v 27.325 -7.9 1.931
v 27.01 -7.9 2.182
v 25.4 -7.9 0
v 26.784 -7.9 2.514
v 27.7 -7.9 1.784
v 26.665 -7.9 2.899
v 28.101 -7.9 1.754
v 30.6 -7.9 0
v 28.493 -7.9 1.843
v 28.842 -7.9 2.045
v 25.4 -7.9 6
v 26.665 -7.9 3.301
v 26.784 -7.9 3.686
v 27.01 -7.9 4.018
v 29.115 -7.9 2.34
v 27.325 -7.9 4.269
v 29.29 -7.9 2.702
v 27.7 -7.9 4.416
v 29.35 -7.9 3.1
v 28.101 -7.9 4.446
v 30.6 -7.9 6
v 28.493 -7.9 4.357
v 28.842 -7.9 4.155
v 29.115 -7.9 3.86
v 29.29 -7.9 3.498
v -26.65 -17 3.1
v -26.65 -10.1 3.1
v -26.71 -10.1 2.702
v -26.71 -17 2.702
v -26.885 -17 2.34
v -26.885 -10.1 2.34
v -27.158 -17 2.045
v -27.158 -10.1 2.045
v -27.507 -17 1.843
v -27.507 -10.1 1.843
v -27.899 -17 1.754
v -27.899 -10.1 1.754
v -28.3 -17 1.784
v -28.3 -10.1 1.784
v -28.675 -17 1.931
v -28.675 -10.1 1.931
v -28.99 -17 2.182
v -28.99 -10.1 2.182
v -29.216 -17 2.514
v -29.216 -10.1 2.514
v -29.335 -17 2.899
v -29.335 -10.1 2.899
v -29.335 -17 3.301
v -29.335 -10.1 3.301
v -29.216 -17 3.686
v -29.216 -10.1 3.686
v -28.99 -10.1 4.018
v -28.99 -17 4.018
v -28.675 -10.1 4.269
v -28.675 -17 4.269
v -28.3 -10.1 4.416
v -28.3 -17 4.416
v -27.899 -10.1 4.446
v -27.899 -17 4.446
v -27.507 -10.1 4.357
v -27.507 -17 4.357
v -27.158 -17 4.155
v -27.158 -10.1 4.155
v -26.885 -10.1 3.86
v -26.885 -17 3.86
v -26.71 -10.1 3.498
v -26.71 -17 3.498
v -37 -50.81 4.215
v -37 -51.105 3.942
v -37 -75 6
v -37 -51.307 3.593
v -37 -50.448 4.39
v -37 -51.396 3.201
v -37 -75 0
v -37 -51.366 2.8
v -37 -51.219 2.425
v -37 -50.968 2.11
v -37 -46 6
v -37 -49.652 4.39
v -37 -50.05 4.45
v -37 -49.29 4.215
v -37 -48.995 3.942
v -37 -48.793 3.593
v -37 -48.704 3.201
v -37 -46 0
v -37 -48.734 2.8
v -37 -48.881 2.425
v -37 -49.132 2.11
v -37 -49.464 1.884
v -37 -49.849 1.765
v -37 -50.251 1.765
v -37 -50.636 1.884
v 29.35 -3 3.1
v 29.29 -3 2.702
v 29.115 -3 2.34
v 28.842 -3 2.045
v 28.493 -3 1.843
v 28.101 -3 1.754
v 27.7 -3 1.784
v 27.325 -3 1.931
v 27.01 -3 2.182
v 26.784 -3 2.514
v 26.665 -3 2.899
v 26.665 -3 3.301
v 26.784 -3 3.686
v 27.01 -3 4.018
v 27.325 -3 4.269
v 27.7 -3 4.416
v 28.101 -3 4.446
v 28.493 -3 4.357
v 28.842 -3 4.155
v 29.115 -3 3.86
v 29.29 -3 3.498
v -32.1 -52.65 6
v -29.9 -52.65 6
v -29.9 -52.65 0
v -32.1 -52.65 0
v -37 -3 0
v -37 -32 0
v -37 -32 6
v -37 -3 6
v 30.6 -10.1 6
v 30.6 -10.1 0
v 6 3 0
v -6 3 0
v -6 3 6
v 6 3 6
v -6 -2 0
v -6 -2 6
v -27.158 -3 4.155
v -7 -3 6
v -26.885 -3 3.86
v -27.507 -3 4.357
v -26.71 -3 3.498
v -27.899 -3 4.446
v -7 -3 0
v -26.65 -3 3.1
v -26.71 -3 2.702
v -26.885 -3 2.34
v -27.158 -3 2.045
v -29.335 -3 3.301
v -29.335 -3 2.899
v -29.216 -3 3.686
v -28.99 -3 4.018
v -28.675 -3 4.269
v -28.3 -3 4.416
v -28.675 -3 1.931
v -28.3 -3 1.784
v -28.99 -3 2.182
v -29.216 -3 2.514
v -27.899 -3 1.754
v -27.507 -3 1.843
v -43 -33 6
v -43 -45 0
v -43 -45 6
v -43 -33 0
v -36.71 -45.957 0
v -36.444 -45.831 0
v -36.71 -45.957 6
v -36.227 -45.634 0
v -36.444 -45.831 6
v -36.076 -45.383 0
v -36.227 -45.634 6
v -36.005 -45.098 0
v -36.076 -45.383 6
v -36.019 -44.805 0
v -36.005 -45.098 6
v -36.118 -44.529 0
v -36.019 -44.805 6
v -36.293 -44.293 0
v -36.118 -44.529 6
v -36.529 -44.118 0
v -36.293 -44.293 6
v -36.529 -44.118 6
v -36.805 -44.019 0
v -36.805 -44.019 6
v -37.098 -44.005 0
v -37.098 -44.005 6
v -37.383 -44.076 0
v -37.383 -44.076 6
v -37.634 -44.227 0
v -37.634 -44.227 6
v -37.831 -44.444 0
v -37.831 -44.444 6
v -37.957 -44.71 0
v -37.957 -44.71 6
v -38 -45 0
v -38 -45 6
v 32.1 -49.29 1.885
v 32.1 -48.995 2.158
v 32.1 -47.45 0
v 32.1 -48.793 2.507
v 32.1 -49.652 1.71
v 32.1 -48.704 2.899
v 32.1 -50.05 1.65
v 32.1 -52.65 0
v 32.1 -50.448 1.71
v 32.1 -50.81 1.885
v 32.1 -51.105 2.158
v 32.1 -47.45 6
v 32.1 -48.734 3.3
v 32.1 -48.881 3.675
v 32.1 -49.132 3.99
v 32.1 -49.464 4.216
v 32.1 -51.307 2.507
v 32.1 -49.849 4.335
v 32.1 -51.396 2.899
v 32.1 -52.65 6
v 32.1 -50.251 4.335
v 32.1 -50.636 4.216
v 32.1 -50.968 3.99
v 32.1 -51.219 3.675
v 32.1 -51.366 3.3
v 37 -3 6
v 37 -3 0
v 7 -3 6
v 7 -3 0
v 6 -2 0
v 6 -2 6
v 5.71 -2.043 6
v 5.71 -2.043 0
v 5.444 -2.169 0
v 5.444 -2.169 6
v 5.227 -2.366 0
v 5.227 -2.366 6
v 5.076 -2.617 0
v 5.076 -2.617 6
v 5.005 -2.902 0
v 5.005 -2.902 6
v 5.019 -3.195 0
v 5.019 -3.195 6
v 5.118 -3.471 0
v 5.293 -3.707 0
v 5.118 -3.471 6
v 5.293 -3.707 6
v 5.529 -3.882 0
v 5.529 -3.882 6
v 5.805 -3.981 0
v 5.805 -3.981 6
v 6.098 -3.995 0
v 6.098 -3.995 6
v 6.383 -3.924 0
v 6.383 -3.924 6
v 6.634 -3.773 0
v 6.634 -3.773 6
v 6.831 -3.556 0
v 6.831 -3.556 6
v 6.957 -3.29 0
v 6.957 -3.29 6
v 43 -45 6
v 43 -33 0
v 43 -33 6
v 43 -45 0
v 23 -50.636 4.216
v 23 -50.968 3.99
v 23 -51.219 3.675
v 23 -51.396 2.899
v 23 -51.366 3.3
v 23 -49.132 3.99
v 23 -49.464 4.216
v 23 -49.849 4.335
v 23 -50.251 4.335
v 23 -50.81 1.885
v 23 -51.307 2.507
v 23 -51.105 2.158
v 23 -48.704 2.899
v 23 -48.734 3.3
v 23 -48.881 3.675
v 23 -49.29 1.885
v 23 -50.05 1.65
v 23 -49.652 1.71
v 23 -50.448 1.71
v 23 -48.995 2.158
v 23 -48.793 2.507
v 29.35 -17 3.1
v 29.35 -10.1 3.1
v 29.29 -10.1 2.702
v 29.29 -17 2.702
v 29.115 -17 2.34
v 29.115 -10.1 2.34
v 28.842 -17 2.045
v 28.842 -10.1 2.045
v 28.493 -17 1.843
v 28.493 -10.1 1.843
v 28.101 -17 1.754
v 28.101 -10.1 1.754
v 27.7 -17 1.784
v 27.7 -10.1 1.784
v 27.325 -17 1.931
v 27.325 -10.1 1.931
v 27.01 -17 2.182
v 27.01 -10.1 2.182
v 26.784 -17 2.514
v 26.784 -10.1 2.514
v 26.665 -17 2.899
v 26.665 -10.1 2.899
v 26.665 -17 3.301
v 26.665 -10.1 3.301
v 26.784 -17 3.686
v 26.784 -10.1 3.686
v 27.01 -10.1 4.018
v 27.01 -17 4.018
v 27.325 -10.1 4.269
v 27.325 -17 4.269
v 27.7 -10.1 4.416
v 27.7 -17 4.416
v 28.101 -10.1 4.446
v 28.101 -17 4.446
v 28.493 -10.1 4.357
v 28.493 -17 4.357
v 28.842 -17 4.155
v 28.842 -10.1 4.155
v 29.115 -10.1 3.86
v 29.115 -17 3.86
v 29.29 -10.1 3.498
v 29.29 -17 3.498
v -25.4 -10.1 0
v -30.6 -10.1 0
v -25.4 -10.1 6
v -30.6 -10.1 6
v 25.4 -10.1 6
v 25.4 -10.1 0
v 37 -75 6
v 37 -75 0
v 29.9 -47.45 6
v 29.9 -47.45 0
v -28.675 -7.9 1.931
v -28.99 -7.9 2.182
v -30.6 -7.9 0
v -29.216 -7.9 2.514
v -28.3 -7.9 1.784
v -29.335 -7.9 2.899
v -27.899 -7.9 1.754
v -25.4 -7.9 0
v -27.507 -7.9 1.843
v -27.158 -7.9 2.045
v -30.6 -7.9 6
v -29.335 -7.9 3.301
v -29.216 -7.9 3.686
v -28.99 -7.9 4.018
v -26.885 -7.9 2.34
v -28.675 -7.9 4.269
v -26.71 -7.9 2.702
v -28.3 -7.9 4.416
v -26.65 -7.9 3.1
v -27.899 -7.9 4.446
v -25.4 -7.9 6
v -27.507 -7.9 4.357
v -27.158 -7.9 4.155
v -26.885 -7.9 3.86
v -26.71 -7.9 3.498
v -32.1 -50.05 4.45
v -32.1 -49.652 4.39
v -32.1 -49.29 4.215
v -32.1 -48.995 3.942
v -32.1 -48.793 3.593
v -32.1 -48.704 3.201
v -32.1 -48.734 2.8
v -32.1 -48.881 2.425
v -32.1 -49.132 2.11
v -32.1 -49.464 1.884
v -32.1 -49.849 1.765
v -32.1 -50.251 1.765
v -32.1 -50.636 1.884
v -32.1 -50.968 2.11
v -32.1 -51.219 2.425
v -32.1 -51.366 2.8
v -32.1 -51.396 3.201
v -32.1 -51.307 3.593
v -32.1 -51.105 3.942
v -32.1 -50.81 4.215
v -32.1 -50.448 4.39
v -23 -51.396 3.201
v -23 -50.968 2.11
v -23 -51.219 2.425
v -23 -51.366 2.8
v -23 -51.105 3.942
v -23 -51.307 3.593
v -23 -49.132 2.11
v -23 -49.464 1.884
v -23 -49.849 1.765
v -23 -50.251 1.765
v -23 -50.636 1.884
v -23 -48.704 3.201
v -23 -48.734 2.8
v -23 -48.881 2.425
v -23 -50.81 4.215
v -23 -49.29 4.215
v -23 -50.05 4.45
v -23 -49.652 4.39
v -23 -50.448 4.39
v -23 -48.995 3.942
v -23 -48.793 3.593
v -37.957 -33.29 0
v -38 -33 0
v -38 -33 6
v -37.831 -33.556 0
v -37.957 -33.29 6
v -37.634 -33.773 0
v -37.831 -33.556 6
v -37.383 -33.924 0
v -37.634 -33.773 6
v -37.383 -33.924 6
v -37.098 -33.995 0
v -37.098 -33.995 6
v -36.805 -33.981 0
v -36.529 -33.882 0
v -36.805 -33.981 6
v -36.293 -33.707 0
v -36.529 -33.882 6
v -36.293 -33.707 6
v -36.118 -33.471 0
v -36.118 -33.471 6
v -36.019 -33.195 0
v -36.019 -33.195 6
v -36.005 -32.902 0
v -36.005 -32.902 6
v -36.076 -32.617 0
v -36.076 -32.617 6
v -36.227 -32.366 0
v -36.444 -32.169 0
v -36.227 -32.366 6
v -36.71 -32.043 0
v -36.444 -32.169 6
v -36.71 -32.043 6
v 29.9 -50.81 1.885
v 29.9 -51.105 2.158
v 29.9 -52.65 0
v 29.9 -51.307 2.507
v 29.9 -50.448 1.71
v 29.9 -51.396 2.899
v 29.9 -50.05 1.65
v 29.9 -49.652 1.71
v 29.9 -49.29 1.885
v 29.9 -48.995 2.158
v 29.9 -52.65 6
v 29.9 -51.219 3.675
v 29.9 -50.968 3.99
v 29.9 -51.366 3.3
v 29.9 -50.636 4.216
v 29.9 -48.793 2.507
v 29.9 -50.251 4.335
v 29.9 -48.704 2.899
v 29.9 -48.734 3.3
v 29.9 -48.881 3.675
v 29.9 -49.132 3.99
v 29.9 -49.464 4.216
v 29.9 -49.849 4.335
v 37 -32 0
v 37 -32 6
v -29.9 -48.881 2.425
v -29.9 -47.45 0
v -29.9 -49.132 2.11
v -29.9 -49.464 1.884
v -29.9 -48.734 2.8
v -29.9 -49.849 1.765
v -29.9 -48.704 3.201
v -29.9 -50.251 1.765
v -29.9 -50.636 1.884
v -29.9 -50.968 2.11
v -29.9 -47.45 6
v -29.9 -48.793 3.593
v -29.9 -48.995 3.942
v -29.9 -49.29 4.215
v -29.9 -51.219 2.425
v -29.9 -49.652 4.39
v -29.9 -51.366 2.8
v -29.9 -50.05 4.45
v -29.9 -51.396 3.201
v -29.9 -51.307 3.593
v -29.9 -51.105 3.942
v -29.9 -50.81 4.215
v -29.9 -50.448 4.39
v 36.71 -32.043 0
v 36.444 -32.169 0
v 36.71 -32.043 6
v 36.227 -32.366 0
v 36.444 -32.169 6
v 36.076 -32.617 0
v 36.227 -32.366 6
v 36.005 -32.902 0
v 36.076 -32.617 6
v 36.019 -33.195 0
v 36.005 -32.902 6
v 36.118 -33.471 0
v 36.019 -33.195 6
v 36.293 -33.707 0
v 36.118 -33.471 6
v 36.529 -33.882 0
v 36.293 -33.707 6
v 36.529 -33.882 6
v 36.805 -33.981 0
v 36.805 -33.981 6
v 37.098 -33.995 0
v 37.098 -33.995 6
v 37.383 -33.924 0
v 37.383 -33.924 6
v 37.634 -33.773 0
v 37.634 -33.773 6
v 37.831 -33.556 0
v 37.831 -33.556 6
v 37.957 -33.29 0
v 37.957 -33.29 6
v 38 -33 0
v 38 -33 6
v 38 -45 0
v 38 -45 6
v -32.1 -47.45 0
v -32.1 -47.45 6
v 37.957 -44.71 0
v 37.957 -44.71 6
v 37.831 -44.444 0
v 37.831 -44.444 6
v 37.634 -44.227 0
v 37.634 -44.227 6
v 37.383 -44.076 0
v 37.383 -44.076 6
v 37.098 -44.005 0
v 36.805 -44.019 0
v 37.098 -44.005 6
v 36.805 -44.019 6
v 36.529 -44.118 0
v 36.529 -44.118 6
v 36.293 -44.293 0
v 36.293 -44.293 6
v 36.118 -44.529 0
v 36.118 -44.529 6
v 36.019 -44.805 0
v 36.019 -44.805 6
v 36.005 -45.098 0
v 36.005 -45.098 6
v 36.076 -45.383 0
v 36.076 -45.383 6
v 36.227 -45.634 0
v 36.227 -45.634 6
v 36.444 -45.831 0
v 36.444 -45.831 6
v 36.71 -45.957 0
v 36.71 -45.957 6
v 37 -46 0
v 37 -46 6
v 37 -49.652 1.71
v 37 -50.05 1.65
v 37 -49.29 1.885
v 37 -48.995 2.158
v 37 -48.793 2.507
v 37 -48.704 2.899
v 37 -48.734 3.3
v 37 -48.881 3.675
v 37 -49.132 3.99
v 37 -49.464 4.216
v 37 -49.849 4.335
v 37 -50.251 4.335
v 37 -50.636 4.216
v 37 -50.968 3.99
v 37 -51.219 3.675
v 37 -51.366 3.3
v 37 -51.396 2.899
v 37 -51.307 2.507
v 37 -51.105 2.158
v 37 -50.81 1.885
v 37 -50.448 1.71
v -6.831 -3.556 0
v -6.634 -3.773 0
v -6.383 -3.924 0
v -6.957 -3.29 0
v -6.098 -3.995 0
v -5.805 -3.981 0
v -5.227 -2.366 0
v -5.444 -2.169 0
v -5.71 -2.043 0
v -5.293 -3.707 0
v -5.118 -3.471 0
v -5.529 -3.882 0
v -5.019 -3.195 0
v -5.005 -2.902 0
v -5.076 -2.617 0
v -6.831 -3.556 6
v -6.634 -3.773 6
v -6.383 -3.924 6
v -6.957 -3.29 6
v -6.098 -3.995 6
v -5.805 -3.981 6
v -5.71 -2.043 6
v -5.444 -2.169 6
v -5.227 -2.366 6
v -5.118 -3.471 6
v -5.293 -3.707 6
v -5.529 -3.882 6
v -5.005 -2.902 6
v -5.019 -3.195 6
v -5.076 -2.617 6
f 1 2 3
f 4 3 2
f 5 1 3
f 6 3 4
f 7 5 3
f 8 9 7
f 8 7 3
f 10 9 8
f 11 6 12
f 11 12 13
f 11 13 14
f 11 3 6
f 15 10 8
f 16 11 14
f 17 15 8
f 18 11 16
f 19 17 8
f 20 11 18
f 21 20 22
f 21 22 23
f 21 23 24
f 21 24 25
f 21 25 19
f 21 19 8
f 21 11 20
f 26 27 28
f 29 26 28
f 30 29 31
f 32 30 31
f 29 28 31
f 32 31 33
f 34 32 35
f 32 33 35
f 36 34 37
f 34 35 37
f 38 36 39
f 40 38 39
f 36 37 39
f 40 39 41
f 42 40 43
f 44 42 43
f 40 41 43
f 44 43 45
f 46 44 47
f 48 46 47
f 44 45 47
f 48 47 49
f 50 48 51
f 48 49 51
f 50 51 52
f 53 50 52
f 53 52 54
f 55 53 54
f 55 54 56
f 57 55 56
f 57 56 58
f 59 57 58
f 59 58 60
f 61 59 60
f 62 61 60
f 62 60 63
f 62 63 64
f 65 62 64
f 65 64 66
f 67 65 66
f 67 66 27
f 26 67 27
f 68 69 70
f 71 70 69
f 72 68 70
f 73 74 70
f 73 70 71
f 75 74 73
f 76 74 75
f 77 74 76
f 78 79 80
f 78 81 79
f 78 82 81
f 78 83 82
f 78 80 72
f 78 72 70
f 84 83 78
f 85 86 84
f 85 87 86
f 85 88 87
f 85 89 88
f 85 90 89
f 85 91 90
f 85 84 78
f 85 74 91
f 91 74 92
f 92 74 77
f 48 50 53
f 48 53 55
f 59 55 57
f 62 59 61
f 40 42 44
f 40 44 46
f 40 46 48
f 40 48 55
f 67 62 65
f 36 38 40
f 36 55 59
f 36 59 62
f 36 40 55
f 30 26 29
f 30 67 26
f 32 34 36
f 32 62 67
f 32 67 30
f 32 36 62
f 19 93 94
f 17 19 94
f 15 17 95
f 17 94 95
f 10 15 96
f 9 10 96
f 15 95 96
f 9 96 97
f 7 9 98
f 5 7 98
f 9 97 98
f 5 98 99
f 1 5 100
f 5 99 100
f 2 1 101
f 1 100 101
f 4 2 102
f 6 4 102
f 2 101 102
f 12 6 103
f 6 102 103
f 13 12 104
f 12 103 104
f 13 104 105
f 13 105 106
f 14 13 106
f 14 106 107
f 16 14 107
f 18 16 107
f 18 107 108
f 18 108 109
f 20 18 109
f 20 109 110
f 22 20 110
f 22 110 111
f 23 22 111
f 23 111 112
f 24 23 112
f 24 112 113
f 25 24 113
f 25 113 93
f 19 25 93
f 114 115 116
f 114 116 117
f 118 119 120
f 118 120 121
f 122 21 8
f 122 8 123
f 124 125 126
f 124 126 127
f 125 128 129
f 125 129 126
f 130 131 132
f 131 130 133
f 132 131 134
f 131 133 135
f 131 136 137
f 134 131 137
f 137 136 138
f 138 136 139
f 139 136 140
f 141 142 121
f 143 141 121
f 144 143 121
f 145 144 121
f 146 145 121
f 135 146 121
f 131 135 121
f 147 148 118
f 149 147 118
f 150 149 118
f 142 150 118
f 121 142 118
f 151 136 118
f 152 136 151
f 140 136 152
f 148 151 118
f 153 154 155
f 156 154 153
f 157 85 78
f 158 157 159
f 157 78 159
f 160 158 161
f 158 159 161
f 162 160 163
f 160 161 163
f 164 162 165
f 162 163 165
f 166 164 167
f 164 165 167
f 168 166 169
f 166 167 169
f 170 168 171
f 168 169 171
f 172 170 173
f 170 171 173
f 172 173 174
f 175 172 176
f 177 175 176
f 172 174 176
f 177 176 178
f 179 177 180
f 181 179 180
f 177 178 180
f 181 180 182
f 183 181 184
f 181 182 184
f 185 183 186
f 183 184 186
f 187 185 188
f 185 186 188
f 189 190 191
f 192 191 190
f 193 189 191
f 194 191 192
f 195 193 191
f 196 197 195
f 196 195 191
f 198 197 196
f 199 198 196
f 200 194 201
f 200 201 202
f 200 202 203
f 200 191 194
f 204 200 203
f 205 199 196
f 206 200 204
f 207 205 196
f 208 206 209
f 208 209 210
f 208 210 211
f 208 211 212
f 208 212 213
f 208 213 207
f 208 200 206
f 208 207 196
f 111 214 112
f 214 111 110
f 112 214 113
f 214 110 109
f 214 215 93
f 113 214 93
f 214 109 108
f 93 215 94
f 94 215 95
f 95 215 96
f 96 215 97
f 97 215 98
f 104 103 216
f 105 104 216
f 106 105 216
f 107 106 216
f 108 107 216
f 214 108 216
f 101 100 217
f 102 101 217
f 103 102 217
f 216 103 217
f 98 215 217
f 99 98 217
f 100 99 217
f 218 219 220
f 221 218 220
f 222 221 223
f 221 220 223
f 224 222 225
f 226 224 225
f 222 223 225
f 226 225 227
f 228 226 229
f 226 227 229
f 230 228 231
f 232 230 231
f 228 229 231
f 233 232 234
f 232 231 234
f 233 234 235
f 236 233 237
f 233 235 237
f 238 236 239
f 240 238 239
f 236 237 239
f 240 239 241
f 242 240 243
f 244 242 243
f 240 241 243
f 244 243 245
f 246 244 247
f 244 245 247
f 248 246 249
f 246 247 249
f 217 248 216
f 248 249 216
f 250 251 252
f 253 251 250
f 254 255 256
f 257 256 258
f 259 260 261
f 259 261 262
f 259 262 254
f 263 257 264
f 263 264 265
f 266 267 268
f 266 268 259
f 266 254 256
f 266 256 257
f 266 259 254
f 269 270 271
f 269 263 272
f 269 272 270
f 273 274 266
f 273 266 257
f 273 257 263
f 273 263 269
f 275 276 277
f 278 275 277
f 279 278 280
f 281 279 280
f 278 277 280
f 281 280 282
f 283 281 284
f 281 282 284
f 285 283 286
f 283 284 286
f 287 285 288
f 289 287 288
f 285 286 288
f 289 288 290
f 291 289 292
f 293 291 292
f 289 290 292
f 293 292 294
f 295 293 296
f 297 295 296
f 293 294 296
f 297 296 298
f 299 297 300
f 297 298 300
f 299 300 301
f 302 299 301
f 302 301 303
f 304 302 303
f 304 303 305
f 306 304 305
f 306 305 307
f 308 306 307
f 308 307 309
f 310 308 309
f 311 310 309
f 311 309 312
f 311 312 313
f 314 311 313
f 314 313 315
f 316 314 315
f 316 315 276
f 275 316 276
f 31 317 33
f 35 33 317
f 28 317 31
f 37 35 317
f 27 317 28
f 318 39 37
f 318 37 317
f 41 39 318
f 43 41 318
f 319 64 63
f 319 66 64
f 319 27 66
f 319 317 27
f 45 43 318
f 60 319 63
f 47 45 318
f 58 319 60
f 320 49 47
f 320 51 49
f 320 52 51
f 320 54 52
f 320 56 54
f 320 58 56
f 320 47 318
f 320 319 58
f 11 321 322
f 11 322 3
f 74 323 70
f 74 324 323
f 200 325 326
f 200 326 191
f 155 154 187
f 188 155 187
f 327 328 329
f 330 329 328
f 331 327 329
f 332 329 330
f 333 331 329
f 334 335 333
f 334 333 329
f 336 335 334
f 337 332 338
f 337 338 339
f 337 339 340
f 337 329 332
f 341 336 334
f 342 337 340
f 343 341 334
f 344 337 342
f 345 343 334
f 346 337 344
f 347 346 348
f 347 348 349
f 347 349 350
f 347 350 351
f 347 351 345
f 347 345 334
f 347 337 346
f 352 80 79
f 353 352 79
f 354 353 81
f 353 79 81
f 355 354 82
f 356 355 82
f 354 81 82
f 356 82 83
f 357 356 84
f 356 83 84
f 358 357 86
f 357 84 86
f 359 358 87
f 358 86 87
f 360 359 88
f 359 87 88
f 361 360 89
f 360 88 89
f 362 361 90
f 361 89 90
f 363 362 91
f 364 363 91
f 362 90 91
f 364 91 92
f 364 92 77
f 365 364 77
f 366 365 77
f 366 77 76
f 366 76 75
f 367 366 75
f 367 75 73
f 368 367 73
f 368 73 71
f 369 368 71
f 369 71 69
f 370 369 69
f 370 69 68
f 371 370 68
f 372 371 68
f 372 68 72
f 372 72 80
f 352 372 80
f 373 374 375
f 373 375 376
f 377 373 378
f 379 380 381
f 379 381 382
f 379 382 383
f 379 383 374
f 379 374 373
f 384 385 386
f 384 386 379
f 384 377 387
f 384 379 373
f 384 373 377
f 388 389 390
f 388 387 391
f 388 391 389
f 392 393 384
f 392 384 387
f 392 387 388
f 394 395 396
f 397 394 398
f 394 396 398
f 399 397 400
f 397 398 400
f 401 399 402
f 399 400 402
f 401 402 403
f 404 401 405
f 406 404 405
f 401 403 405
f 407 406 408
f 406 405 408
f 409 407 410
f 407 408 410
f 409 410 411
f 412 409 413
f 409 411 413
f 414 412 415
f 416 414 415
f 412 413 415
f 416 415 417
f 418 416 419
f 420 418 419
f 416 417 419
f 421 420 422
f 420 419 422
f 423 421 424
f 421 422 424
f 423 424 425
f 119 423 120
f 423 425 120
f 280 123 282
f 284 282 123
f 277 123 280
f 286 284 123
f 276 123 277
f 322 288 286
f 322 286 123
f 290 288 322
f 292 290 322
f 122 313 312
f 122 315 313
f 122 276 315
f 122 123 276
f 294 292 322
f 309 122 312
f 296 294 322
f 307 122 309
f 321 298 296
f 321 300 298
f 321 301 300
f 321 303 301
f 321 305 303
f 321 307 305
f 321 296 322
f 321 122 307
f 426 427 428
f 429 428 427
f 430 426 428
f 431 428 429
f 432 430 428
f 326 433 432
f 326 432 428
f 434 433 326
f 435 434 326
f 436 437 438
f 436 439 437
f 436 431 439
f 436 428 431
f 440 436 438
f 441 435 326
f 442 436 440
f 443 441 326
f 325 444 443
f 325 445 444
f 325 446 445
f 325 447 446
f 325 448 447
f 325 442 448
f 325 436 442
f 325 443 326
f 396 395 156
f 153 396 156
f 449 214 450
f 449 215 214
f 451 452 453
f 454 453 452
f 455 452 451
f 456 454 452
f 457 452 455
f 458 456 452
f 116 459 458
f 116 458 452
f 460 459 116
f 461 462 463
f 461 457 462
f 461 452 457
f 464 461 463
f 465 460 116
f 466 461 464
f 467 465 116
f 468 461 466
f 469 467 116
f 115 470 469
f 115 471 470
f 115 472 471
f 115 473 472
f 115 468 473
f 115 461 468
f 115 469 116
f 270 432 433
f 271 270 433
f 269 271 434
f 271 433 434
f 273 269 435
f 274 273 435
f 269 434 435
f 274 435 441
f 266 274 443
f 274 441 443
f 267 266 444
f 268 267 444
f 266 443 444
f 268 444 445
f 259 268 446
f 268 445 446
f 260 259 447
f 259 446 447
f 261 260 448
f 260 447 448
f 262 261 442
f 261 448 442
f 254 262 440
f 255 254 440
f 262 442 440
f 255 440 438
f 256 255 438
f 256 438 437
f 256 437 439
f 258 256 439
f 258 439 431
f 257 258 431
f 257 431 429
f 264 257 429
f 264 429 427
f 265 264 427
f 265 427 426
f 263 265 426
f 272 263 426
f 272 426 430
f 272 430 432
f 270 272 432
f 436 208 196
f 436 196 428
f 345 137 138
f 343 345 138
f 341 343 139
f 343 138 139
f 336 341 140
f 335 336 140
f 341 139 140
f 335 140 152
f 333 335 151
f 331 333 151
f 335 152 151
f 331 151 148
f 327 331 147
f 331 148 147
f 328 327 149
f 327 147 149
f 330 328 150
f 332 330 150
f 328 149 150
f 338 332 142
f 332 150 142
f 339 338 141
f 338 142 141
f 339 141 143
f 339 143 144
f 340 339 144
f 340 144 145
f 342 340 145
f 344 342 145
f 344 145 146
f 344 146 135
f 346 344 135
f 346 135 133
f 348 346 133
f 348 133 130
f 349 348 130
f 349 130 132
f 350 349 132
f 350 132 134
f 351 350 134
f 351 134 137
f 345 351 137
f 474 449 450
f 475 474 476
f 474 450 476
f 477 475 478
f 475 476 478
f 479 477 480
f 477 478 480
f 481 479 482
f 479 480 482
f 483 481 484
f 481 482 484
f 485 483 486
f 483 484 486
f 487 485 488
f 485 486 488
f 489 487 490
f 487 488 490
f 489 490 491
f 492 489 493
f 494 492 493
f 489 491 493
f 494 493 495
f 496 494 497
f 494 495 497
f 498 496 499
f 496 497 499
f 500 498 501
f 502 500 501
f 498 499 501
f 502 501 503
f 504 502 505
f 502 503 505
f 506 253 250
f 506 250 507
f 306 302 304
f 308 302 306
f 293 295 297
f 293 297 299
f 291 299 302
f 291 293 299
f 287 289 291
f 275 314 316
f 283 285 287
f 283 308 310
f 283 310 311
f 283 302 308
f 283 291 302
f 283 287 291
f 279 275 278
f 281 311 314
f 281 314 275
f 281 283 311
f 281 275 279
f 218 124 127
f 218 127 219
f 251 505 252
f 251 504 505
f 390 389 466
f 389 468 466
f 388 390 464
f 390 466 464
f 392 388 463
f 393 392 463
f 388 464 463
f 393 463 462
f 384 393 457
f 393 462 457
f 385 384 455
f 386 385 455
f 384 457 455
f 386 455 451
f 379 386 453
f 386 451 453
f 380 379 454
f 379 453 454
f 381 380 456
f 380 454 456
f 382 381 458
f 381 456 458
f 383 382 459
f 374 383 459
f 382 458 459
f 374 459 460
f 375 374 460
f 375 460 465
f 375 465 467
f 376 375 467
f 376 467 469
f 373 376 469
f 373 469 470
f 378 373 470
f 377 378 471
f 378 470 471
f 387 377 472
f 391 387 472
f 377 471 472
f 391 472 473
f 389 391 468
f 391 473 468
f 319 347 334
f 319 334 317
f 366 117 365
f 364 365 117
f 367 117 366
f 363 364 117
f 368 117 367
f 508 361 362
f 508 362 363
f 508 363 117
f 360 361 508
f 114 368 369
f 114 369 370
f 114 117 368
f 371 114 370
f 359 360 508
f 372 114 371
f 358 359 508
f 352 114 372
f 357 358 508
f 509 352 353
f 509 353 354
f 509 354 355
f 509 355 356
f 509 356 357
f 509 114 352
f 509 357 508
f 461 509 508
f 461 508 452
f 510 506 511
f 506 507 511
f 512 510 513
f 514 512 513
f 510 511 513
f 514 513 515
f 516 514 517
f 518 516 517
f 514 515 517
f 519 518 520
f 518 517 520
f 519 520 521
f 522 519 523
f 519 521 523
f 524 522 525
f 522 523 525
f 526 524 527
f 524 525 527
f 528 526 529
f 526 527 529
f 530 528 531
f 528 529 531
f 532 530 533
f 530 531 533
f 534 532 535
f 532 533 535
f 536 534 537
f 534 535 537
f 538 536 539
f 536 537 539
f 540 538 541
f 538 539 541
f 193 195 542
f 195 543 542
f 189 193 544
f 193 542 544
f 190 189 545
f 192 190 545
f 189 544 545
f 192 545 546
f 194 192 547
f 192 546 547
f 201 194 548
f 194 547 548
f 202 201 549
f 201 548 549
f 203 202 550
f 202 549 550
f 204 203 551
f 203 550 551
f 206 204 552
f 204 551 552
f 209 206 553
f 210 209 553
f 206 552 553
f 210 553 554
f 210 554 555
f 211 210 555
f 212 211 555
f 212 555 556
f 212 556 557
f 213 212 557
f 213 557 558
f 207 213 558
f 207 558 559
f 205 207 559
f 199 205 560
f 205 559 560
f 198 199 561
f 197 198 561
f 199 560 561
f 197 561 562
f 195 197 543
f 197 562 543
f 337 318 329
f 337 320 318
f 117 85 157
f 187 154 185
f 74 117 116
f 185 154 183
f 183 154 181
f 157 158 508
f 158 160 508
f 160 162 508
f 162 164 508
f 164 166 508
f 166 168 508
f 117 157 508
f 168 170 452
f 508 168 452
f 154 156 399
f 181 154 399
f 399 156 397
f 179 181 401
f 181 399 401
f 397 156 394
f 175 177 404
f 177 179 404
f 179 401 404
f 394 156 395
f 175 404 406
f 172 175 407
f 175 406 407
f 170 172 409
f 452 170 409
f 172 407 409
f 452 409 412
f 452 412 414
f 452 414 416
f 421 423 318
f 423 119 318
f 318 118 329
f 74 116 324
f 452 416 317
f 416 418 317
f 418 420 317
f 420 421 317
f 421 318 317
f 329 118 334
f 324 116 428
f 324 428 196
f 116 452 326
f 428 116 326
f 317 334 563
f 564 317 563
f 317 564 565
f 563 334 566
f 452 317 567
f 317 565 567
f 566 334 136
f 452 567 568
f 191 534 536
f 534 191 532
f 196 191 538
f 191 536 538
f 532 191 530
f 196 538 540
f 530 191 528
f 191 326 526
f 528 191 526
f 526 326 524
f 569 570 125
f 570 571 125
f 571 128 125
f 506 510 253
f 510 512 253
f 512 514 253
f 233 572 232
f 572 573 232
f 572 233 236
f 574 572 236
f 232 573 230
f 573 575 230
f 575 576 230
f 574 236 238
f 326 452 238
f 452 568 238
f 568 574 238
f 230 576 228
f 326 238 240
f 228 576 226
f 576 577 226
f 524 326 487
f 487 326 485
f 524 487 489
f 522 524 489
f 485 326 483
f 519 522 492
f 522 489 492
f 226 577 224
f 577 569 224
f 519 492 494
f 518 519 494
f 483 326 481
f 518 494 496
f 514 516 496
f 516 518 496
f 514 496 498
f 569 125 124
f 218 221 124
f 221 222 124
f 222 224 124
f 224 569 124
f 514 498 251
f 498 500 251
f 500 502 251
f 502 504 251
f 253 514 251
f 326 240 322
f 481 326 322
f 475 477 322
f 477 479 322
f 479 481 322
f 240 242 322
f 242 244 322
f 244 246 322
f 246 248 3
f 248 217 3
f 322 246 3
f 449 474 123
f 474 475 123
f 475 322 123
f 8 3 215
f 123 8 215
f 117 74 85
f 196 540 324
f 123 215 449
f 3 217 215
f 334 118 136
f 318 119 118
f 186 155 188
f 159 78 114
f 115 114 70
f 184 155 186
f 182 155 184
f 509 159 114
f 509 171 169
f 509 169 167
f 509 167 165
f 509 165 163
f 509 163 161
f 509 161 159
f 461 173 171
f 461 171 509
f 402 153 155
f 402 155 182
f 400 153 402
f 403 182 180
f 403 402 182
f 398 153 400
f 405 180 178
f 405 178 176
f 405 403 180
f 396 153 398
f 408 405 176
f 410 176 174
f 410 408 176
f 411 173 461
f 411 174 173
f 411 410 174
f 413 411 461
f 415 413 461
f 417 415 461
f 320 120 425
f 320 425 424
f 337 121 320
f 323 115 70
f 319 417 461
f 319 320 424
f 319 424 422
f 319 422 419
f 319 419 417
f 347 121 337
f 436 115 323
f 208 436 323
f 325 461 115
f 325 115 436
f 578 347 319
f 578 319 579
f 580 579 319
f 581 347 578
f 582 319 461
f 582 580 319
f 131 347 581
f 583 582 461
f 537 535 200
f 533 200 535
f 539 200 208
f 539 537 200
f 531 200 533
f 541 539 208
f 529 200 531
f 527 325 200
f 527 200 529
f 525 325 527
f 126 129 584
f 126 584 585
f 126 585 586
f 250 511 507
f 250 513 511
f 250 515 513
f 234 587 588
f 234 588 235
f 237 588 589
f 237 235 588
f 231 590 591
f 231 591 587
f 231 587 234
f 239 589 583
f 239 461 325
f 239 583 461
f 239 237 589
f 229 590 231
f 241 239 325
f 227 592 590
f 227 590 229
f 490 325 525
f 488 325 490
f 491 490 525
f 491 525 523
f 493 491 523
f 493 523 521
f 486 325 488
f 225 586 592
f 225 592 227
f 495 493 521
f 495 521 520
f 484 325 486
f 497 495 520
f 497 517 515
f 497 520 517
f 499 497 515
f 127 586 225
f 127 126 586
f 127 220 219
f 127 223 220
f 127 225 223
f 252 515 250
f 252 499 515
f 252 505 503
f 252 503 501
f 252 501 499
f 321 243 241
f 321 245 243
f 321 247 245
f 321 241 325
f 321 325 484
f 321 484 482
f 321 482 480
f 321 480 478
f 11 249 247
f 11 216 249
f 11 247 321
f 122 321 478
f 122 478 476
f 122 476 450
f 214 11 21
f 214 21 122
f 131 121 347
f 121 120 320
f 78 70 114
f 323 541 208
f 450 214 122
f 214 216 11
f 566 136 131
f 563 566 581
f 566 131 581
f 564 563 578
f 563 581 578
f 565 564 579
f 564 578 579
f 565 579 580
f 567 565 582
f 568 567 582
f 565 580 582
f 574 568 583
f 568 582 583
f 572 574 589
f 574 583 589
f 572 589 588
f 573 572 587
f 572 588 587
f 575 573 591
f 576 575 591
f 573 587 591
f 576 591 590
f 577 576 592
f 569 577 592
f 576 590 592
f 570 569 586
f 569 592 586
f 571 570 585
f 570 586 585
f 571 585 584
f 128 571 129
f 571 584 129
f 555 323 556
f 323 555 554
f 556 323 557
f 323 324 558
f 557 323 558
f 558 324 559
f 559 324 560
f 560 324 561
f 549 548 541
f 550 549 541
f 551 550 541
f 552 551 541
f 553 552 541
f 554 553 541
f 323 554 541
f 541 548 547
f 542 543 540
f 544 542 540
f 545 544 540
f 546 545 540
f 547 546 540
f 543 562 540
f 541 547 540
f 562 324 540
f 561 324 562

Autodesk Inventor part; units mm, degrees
ref_plane "YZ Plane" through (0, 0, 0) normal (1, 0, 0) x (0, 1, 0)
ref_plane "XZ Plane" through (0, 0, 0) normal (0, 1, 0) x (-1, 0, 0)
ref_plane "XY Plane" through (0, 0, 0) normal (0, 0, 1) x (1, 0, 0)
sketch "스케치1" plane through (0, 0, 0) normal (0, 0, 1) x (1, 0, 0)
  line L0 (-6.05, -3) -> (-6.05, 3) projected
  line L1 (6.05, -3) -> (-6.05, -3) projected
  line L2 (6.05, 3) -> (6.05, -3) projected
  line L3 (-6.05, 3) -> (6.05, 3) projected
  line L4 (6.05, 3) -> (6.05, -3) projected
  line L5 (6.05, -3) -> (43, -3) projected
  line L6 (43, 3) -> (43, -3) projected
  line L7 (6.05, 3) -> (43, 3) projected
  circle A0 centre (20, 0) radius 1.35 projected
  circle A1 centre (-20, 0) radius 1.35 projected
  line L8 (-6.05, -3) -> (-6.05, 3) projected
  line L9 (-6.05, 3) -> (-43, 3) projected
  line L10 (-43, -3) -> (-43, 3) projected
  line L11 (-6.05, -3) -> (-43, -3) projected
  line L12 (-43, -32.95) -> (-37, -32.95) projected
  line L13 (-37, -32.95) -> (-37, -3) projected
  line L14 (-37, -3) -> (-43, -3) projected
  line L15 (-43, -3) -> (-43, -32.95) projected
  line L16 (-43, -45.05) -> (-43, -32.95) projected
  line L17 (-37, -45.05) -> (-43, -45.05) projected
  line L18 (-37, -32.95) -> (-37, -45.05) projected
  line L19 (-43, -32.95) -> (-37, -32.95) projected
  line L20 (-37, -45.05) -> (-43, -45.05) projected
  line L21 (-43, -45.05) -> (-43, -75) projected
  line L22 (-43, -75) -> (-37, -75) projected
  line L23 (-37, -75) -> (-37, -45.05) projected
  line L24 (37, -32.95) -> (43, -32.95) projected
  line L25 (43, -32.95) -> (43, -3) projected
  line L26 (43, -3) -> (37, -3) projected
  line L27 (37, -3) -> (37, -32.95) projected
  line L28 (37, -45.05) -> (37, -32.95) projected
  line L29 (43, -45.05) -> (37, -45.05) projected
  line L30 (43, -32.95) -> (43, -45.05) projected
  line L31 (37, -32.95) -> (43, -32.95) projected
  line L32 (43, -45.05) -> (37, -45.05) projected
  line L33 (37, -45.05) -> (37, -75) projected
  line L34 (37, -75) -> (43, -75) projected
  line L35 (43, -75) -> (43, -45.05) projected
  line L36 (-37, -3) -> (37, -3)
  line L37 (37, -3) -> (37, -75)
  line L38 (37, -75) -> (-37, -75)
  line L39 (-37, -75) -> (-37, -3)
  line L40 (6, -3) -> (-6, -3)
  line L41 (-6, -3) -> (-6, 3)
  line L42 (-6, 3) -> (6, 3)
  line L43 (6, 3) -> (6, -3)
  line L44 (37, -33) -> (43, -33)
  line L45 (43, -33) -> (43, -45)
  line L46 (43, -45) -> (37, -45)
  line L47 (37, -45) -> (37, -33)
  line L48 (-37, -33) -> (-43, -33)
  line L49 (-43, -33) -> (-43, -45)
  line L50 (-43, -45) -> (-37, -45)
  line L51 (-37, -45) -> (-37, -33)
  point P0 (0, 0)
  dimension "d0" = 12
  dimension "d1" = 6
  dimension "d2" = 6
  dimension "d3" = 12
  dimension "d4" = 6
  dimension "d5" = 12
extrude "돌출1" add sketch "스케치1" along normal blind 6 contours L1 L5 L27 L28 L33 L38 L23 L18 L13 L11 | L41 L3 L43 L1 | L18 L50 L16 L48 | L44 L30 L46 L28
sketch "스케치2" plane through (-6, 3, 0) normal (0, 1, 0) x (1, 0, 0)
  circle A0 centre (34, -3.1) radius 1.35 projected
  circle A1 centre (-22, -3.1) radius 1.35 projected
  circle A2 centre (34, -3.1) radius 1.35
  circle A3 centre (-22, -3.1) radius 1.35
  point P0 (6, 0)
extrude "돌출2" cut sketch "스케치2" against normal blind 20
sketch "스케치3" plane through (-43, -45, 0) normal (-1, 0, 0) x (0, 0, 1)
  circle A0 centre (3.1, -5.05) radius 1.35 projected
  circle A1 centre (3.1, -5.05) radius 1.35
  point P0 (0, 45)
extrude "돌출3" cut sketch "스케치3" against normal blind 20
sketch "스케치4" plane through (43, -45, 0) normal (1, 0, 0) x (0, 0, -1)
  circle A0 centre (-3, -5.05) radius 1.35 projected
  circle A1 centre (-3, -5.05) radius 1.35
  point P0 (0, 45)
extrude "돌출4" cut sketch "스케치4" against normal blind 20
sketch "스케치5" plane through (0, 0, 6) normal (0, 0, 1) x (1, 0, 0)
  line L0 (37, -48.7) -> (23, -48.7) projected
  line L1 (37, -51.4) -> (23, -51.4) projected
  line L2 (-37, -51.4) -> (-23, -51.4) projected
  line L3 (-37, -48.7) -> (-23, -48.7) projected
  line L4 (-26.65, -3) -> (-26.65, -17) projected
  line L5 (-29.35, -3) -> (-29.35, -17) projected
  line L6 (29.35, -3) -> (29.35, -17) projected
  line L7 (26.65, -3) -> (26.65, -17) projected
  line L8 (31, -51.4) -> (31, -48.7)
  line L9 (-31, -51.4) -> (-31, -48.7)
  line L10 (29.35, -9) -> (26.65, -9)
  line L11 (-26.65, -9) -> (-29.35, -9)
  line L12 (25.4, -7.9) -> (30.6, -7.9)
  line L13 (30.6, -7.9) -> (30.6, -10.1)
  line L14 (30.6, -10.1) -> (25.4, -10.1)
  line L15 (25.4, -10.1) -> (25.4, -7.9)
  line L16 (25.4, -7.9) -> (30.6, -10.1) construction
  line L17 (30.6, -7.9) -> (25.4, -10.1) construction
  line L18 (29.9, -47.45) -> (32.1, -47.45)
  line L19 (32.1, -47.45) -> (32.1, -52.65)
  line L20 (32.1, -52.65) -> (29.9, -52.65)
  line L21 (29.9, -52.65) -> (29.9, -47.45)
  line L22 (29.9, -47.45) -> (32.1, -52.65) construction
  line L23 (32.1, -47.45) -> (29.9, -52.65) construction
  line L24 (-30.6, -7.9) -> (-25.4, -7.9)
  line L25 (-25.4, -7.9) -> (-25.4, -10.1)
  line L26 (-25.4, -10.1) -> (-30.6, -10.1)
  line L27 (-30.6, -10.1) -> (-30.6, -7.9)
  line L28 (-30.6, -7.9) -> (-25.4, -10.1) construction
  line L29 (-25.4, -7.9) -> (-30.6, -10.1) construction
  line L30 (-32.1, -47.45) -> (-29.9, -47.45)
  line L31 (-29.9, -47.45) -> (-29.9, -52.65)
  line L32 (-29.9, -52.65) -> (-32.1, -52.65)
  line L33 (-32.1, -52.65) -> (-32.1, -47.45)
  line L34 (-32.1, -47.45) -> (-29.9, -52.65) construction
  line L35 (-29.9, -47.45) -> (-32.1, -52.65) construction
  point P0 (0, 0)
  point P1 (28, -9)
  point P2 (31, -50.05)
  point P3 (-28, -9)
  point P4 (-31, -50.05)
  dimension "d14" = 5.2
  dimension "d15" = 2.2
  dimension "d16" = 2.2
  dimension "d17" = 5.2
  dimension "d18" = 5.2
  dimension "d19" = 2.2
  dimension "d20" = 2.2
  dimension "d21" = 5.2
extrude "돌출5" cut sketch "스케치5" against normal blind 20
sketch "스케치6" plane through (0, 0, 6) normal (0, 0, 1) x (1, 0, 0)
  line L0 (-32.1, -52.65) -> (-32.1, -47.45) projected
  line L1 (-32.1, -47.45) -> (-29.9, -47.45) projected
  line L2 (-29.9, -47.45) -> (-29.9, -52.65) projected
  line L3 (-29.9, -52.65) -> (-32.1, -52.65) projected
  line L4 (29.9, -52.65) -> (29.9, -47.45) projected
  line L5 (29.9, -47.45) -> (32.1, -47.45) projected
  line L6 (32.1, -47.45) -> (32.1, -52.65) projected
  line L7 (32.1, -52.65) -> (29.9, -52.65) projected
  line L8 (-30.6, -7.9) -> (-25.4, -7.9) projected
  line L9 (-25.4, -7.9) -> (-25.4, -10.1) projected
  line L10 (-25.4, -10.1) -> (-30.6, -10.1) projected
  line L11 (-30.6, -10.1) -> (-30.6, -7.9) projected
  line L12 (30.6, -10.1) -> (25.4, -10.1) projected
  line L13 (25.4, -10.1) -> (25.4, -7.9) projected
  line L14 (25.4, -7.9) -> (30.6, -7.9) projected
  line L15 (30.6, -7.9) -> (30.6, -10.1) projected
  line L16 (37, -75) -> (37, -45) projected
  line L17 (37, -45) -> (43, -45) projected
  line L18 (43, -45) -> (43, -33) projected
  line L19 (43, -33) -> (37, -33) projected
  line L20 (37, -33) -> (37, -3) projected
  line L21 (37, -3) -> (6, -3) projected
  line L22 (6, -3) -> (6, 3) projected
  line L23 (6, 3) -> (-6, 3) projected
  line L24 (-6, 3) -> (-6, -3) projected
  line L25 (-6, -3) -> (-37, -3) projected
  line L26 (-37, -3) -> (-37, -33) projected
  line L27 (-37, -33) -> (-43, -33) projected
  line L28 (-43, -33) -> (-43, -45) projected
  line L29 (-43, -45) -> (-37, -45) projected
  line L30 (-37, -45) -> (-37, -75) projected
  line L31 (-37, -75) -> (37, -75) projected
  circle A0 centre (6, -3) radius 1
  circle A1 centre (-6, -3) radius 1
  circle A2 centre (37, -33) radius 1
  circle A3 centre (37, -45) radius 1
  circle A4 centre (-37, -33) radius 1
  circle A5 centre (-37, -45) radius 1
  point P0 (0, 0)
  point P1 (38, -45)
  point P2 (37, -46)
  point P3 (-37, -46)
  point P4 (-38, -45)
  point P5 (6, -2)
  point P6 (7, -3)
  dimension "d24" = 2
  dimension "d25" = 2
  dimension "d26" = 2
  dimension "d27" = 2
  dimension "d28" = 2
  dimension "d29" = 2
extrude "돌출6" cut sketch "스케치6" against normal through all contours A3 L17 L16 | L30 L29 A5 | A2 L20 L19 | L19 L20 A2 | A4 L26 L27 | L27 L26 A4 | A0 L22 L21 | A1 L24 L25 | L25 L24 A1 picked at (36.339, -44.9727) picked at (-37.1584, -44.3574) picked at (5.6614, -3.5683)
properties part number "overhead" material "PMMA 플라스틱"
